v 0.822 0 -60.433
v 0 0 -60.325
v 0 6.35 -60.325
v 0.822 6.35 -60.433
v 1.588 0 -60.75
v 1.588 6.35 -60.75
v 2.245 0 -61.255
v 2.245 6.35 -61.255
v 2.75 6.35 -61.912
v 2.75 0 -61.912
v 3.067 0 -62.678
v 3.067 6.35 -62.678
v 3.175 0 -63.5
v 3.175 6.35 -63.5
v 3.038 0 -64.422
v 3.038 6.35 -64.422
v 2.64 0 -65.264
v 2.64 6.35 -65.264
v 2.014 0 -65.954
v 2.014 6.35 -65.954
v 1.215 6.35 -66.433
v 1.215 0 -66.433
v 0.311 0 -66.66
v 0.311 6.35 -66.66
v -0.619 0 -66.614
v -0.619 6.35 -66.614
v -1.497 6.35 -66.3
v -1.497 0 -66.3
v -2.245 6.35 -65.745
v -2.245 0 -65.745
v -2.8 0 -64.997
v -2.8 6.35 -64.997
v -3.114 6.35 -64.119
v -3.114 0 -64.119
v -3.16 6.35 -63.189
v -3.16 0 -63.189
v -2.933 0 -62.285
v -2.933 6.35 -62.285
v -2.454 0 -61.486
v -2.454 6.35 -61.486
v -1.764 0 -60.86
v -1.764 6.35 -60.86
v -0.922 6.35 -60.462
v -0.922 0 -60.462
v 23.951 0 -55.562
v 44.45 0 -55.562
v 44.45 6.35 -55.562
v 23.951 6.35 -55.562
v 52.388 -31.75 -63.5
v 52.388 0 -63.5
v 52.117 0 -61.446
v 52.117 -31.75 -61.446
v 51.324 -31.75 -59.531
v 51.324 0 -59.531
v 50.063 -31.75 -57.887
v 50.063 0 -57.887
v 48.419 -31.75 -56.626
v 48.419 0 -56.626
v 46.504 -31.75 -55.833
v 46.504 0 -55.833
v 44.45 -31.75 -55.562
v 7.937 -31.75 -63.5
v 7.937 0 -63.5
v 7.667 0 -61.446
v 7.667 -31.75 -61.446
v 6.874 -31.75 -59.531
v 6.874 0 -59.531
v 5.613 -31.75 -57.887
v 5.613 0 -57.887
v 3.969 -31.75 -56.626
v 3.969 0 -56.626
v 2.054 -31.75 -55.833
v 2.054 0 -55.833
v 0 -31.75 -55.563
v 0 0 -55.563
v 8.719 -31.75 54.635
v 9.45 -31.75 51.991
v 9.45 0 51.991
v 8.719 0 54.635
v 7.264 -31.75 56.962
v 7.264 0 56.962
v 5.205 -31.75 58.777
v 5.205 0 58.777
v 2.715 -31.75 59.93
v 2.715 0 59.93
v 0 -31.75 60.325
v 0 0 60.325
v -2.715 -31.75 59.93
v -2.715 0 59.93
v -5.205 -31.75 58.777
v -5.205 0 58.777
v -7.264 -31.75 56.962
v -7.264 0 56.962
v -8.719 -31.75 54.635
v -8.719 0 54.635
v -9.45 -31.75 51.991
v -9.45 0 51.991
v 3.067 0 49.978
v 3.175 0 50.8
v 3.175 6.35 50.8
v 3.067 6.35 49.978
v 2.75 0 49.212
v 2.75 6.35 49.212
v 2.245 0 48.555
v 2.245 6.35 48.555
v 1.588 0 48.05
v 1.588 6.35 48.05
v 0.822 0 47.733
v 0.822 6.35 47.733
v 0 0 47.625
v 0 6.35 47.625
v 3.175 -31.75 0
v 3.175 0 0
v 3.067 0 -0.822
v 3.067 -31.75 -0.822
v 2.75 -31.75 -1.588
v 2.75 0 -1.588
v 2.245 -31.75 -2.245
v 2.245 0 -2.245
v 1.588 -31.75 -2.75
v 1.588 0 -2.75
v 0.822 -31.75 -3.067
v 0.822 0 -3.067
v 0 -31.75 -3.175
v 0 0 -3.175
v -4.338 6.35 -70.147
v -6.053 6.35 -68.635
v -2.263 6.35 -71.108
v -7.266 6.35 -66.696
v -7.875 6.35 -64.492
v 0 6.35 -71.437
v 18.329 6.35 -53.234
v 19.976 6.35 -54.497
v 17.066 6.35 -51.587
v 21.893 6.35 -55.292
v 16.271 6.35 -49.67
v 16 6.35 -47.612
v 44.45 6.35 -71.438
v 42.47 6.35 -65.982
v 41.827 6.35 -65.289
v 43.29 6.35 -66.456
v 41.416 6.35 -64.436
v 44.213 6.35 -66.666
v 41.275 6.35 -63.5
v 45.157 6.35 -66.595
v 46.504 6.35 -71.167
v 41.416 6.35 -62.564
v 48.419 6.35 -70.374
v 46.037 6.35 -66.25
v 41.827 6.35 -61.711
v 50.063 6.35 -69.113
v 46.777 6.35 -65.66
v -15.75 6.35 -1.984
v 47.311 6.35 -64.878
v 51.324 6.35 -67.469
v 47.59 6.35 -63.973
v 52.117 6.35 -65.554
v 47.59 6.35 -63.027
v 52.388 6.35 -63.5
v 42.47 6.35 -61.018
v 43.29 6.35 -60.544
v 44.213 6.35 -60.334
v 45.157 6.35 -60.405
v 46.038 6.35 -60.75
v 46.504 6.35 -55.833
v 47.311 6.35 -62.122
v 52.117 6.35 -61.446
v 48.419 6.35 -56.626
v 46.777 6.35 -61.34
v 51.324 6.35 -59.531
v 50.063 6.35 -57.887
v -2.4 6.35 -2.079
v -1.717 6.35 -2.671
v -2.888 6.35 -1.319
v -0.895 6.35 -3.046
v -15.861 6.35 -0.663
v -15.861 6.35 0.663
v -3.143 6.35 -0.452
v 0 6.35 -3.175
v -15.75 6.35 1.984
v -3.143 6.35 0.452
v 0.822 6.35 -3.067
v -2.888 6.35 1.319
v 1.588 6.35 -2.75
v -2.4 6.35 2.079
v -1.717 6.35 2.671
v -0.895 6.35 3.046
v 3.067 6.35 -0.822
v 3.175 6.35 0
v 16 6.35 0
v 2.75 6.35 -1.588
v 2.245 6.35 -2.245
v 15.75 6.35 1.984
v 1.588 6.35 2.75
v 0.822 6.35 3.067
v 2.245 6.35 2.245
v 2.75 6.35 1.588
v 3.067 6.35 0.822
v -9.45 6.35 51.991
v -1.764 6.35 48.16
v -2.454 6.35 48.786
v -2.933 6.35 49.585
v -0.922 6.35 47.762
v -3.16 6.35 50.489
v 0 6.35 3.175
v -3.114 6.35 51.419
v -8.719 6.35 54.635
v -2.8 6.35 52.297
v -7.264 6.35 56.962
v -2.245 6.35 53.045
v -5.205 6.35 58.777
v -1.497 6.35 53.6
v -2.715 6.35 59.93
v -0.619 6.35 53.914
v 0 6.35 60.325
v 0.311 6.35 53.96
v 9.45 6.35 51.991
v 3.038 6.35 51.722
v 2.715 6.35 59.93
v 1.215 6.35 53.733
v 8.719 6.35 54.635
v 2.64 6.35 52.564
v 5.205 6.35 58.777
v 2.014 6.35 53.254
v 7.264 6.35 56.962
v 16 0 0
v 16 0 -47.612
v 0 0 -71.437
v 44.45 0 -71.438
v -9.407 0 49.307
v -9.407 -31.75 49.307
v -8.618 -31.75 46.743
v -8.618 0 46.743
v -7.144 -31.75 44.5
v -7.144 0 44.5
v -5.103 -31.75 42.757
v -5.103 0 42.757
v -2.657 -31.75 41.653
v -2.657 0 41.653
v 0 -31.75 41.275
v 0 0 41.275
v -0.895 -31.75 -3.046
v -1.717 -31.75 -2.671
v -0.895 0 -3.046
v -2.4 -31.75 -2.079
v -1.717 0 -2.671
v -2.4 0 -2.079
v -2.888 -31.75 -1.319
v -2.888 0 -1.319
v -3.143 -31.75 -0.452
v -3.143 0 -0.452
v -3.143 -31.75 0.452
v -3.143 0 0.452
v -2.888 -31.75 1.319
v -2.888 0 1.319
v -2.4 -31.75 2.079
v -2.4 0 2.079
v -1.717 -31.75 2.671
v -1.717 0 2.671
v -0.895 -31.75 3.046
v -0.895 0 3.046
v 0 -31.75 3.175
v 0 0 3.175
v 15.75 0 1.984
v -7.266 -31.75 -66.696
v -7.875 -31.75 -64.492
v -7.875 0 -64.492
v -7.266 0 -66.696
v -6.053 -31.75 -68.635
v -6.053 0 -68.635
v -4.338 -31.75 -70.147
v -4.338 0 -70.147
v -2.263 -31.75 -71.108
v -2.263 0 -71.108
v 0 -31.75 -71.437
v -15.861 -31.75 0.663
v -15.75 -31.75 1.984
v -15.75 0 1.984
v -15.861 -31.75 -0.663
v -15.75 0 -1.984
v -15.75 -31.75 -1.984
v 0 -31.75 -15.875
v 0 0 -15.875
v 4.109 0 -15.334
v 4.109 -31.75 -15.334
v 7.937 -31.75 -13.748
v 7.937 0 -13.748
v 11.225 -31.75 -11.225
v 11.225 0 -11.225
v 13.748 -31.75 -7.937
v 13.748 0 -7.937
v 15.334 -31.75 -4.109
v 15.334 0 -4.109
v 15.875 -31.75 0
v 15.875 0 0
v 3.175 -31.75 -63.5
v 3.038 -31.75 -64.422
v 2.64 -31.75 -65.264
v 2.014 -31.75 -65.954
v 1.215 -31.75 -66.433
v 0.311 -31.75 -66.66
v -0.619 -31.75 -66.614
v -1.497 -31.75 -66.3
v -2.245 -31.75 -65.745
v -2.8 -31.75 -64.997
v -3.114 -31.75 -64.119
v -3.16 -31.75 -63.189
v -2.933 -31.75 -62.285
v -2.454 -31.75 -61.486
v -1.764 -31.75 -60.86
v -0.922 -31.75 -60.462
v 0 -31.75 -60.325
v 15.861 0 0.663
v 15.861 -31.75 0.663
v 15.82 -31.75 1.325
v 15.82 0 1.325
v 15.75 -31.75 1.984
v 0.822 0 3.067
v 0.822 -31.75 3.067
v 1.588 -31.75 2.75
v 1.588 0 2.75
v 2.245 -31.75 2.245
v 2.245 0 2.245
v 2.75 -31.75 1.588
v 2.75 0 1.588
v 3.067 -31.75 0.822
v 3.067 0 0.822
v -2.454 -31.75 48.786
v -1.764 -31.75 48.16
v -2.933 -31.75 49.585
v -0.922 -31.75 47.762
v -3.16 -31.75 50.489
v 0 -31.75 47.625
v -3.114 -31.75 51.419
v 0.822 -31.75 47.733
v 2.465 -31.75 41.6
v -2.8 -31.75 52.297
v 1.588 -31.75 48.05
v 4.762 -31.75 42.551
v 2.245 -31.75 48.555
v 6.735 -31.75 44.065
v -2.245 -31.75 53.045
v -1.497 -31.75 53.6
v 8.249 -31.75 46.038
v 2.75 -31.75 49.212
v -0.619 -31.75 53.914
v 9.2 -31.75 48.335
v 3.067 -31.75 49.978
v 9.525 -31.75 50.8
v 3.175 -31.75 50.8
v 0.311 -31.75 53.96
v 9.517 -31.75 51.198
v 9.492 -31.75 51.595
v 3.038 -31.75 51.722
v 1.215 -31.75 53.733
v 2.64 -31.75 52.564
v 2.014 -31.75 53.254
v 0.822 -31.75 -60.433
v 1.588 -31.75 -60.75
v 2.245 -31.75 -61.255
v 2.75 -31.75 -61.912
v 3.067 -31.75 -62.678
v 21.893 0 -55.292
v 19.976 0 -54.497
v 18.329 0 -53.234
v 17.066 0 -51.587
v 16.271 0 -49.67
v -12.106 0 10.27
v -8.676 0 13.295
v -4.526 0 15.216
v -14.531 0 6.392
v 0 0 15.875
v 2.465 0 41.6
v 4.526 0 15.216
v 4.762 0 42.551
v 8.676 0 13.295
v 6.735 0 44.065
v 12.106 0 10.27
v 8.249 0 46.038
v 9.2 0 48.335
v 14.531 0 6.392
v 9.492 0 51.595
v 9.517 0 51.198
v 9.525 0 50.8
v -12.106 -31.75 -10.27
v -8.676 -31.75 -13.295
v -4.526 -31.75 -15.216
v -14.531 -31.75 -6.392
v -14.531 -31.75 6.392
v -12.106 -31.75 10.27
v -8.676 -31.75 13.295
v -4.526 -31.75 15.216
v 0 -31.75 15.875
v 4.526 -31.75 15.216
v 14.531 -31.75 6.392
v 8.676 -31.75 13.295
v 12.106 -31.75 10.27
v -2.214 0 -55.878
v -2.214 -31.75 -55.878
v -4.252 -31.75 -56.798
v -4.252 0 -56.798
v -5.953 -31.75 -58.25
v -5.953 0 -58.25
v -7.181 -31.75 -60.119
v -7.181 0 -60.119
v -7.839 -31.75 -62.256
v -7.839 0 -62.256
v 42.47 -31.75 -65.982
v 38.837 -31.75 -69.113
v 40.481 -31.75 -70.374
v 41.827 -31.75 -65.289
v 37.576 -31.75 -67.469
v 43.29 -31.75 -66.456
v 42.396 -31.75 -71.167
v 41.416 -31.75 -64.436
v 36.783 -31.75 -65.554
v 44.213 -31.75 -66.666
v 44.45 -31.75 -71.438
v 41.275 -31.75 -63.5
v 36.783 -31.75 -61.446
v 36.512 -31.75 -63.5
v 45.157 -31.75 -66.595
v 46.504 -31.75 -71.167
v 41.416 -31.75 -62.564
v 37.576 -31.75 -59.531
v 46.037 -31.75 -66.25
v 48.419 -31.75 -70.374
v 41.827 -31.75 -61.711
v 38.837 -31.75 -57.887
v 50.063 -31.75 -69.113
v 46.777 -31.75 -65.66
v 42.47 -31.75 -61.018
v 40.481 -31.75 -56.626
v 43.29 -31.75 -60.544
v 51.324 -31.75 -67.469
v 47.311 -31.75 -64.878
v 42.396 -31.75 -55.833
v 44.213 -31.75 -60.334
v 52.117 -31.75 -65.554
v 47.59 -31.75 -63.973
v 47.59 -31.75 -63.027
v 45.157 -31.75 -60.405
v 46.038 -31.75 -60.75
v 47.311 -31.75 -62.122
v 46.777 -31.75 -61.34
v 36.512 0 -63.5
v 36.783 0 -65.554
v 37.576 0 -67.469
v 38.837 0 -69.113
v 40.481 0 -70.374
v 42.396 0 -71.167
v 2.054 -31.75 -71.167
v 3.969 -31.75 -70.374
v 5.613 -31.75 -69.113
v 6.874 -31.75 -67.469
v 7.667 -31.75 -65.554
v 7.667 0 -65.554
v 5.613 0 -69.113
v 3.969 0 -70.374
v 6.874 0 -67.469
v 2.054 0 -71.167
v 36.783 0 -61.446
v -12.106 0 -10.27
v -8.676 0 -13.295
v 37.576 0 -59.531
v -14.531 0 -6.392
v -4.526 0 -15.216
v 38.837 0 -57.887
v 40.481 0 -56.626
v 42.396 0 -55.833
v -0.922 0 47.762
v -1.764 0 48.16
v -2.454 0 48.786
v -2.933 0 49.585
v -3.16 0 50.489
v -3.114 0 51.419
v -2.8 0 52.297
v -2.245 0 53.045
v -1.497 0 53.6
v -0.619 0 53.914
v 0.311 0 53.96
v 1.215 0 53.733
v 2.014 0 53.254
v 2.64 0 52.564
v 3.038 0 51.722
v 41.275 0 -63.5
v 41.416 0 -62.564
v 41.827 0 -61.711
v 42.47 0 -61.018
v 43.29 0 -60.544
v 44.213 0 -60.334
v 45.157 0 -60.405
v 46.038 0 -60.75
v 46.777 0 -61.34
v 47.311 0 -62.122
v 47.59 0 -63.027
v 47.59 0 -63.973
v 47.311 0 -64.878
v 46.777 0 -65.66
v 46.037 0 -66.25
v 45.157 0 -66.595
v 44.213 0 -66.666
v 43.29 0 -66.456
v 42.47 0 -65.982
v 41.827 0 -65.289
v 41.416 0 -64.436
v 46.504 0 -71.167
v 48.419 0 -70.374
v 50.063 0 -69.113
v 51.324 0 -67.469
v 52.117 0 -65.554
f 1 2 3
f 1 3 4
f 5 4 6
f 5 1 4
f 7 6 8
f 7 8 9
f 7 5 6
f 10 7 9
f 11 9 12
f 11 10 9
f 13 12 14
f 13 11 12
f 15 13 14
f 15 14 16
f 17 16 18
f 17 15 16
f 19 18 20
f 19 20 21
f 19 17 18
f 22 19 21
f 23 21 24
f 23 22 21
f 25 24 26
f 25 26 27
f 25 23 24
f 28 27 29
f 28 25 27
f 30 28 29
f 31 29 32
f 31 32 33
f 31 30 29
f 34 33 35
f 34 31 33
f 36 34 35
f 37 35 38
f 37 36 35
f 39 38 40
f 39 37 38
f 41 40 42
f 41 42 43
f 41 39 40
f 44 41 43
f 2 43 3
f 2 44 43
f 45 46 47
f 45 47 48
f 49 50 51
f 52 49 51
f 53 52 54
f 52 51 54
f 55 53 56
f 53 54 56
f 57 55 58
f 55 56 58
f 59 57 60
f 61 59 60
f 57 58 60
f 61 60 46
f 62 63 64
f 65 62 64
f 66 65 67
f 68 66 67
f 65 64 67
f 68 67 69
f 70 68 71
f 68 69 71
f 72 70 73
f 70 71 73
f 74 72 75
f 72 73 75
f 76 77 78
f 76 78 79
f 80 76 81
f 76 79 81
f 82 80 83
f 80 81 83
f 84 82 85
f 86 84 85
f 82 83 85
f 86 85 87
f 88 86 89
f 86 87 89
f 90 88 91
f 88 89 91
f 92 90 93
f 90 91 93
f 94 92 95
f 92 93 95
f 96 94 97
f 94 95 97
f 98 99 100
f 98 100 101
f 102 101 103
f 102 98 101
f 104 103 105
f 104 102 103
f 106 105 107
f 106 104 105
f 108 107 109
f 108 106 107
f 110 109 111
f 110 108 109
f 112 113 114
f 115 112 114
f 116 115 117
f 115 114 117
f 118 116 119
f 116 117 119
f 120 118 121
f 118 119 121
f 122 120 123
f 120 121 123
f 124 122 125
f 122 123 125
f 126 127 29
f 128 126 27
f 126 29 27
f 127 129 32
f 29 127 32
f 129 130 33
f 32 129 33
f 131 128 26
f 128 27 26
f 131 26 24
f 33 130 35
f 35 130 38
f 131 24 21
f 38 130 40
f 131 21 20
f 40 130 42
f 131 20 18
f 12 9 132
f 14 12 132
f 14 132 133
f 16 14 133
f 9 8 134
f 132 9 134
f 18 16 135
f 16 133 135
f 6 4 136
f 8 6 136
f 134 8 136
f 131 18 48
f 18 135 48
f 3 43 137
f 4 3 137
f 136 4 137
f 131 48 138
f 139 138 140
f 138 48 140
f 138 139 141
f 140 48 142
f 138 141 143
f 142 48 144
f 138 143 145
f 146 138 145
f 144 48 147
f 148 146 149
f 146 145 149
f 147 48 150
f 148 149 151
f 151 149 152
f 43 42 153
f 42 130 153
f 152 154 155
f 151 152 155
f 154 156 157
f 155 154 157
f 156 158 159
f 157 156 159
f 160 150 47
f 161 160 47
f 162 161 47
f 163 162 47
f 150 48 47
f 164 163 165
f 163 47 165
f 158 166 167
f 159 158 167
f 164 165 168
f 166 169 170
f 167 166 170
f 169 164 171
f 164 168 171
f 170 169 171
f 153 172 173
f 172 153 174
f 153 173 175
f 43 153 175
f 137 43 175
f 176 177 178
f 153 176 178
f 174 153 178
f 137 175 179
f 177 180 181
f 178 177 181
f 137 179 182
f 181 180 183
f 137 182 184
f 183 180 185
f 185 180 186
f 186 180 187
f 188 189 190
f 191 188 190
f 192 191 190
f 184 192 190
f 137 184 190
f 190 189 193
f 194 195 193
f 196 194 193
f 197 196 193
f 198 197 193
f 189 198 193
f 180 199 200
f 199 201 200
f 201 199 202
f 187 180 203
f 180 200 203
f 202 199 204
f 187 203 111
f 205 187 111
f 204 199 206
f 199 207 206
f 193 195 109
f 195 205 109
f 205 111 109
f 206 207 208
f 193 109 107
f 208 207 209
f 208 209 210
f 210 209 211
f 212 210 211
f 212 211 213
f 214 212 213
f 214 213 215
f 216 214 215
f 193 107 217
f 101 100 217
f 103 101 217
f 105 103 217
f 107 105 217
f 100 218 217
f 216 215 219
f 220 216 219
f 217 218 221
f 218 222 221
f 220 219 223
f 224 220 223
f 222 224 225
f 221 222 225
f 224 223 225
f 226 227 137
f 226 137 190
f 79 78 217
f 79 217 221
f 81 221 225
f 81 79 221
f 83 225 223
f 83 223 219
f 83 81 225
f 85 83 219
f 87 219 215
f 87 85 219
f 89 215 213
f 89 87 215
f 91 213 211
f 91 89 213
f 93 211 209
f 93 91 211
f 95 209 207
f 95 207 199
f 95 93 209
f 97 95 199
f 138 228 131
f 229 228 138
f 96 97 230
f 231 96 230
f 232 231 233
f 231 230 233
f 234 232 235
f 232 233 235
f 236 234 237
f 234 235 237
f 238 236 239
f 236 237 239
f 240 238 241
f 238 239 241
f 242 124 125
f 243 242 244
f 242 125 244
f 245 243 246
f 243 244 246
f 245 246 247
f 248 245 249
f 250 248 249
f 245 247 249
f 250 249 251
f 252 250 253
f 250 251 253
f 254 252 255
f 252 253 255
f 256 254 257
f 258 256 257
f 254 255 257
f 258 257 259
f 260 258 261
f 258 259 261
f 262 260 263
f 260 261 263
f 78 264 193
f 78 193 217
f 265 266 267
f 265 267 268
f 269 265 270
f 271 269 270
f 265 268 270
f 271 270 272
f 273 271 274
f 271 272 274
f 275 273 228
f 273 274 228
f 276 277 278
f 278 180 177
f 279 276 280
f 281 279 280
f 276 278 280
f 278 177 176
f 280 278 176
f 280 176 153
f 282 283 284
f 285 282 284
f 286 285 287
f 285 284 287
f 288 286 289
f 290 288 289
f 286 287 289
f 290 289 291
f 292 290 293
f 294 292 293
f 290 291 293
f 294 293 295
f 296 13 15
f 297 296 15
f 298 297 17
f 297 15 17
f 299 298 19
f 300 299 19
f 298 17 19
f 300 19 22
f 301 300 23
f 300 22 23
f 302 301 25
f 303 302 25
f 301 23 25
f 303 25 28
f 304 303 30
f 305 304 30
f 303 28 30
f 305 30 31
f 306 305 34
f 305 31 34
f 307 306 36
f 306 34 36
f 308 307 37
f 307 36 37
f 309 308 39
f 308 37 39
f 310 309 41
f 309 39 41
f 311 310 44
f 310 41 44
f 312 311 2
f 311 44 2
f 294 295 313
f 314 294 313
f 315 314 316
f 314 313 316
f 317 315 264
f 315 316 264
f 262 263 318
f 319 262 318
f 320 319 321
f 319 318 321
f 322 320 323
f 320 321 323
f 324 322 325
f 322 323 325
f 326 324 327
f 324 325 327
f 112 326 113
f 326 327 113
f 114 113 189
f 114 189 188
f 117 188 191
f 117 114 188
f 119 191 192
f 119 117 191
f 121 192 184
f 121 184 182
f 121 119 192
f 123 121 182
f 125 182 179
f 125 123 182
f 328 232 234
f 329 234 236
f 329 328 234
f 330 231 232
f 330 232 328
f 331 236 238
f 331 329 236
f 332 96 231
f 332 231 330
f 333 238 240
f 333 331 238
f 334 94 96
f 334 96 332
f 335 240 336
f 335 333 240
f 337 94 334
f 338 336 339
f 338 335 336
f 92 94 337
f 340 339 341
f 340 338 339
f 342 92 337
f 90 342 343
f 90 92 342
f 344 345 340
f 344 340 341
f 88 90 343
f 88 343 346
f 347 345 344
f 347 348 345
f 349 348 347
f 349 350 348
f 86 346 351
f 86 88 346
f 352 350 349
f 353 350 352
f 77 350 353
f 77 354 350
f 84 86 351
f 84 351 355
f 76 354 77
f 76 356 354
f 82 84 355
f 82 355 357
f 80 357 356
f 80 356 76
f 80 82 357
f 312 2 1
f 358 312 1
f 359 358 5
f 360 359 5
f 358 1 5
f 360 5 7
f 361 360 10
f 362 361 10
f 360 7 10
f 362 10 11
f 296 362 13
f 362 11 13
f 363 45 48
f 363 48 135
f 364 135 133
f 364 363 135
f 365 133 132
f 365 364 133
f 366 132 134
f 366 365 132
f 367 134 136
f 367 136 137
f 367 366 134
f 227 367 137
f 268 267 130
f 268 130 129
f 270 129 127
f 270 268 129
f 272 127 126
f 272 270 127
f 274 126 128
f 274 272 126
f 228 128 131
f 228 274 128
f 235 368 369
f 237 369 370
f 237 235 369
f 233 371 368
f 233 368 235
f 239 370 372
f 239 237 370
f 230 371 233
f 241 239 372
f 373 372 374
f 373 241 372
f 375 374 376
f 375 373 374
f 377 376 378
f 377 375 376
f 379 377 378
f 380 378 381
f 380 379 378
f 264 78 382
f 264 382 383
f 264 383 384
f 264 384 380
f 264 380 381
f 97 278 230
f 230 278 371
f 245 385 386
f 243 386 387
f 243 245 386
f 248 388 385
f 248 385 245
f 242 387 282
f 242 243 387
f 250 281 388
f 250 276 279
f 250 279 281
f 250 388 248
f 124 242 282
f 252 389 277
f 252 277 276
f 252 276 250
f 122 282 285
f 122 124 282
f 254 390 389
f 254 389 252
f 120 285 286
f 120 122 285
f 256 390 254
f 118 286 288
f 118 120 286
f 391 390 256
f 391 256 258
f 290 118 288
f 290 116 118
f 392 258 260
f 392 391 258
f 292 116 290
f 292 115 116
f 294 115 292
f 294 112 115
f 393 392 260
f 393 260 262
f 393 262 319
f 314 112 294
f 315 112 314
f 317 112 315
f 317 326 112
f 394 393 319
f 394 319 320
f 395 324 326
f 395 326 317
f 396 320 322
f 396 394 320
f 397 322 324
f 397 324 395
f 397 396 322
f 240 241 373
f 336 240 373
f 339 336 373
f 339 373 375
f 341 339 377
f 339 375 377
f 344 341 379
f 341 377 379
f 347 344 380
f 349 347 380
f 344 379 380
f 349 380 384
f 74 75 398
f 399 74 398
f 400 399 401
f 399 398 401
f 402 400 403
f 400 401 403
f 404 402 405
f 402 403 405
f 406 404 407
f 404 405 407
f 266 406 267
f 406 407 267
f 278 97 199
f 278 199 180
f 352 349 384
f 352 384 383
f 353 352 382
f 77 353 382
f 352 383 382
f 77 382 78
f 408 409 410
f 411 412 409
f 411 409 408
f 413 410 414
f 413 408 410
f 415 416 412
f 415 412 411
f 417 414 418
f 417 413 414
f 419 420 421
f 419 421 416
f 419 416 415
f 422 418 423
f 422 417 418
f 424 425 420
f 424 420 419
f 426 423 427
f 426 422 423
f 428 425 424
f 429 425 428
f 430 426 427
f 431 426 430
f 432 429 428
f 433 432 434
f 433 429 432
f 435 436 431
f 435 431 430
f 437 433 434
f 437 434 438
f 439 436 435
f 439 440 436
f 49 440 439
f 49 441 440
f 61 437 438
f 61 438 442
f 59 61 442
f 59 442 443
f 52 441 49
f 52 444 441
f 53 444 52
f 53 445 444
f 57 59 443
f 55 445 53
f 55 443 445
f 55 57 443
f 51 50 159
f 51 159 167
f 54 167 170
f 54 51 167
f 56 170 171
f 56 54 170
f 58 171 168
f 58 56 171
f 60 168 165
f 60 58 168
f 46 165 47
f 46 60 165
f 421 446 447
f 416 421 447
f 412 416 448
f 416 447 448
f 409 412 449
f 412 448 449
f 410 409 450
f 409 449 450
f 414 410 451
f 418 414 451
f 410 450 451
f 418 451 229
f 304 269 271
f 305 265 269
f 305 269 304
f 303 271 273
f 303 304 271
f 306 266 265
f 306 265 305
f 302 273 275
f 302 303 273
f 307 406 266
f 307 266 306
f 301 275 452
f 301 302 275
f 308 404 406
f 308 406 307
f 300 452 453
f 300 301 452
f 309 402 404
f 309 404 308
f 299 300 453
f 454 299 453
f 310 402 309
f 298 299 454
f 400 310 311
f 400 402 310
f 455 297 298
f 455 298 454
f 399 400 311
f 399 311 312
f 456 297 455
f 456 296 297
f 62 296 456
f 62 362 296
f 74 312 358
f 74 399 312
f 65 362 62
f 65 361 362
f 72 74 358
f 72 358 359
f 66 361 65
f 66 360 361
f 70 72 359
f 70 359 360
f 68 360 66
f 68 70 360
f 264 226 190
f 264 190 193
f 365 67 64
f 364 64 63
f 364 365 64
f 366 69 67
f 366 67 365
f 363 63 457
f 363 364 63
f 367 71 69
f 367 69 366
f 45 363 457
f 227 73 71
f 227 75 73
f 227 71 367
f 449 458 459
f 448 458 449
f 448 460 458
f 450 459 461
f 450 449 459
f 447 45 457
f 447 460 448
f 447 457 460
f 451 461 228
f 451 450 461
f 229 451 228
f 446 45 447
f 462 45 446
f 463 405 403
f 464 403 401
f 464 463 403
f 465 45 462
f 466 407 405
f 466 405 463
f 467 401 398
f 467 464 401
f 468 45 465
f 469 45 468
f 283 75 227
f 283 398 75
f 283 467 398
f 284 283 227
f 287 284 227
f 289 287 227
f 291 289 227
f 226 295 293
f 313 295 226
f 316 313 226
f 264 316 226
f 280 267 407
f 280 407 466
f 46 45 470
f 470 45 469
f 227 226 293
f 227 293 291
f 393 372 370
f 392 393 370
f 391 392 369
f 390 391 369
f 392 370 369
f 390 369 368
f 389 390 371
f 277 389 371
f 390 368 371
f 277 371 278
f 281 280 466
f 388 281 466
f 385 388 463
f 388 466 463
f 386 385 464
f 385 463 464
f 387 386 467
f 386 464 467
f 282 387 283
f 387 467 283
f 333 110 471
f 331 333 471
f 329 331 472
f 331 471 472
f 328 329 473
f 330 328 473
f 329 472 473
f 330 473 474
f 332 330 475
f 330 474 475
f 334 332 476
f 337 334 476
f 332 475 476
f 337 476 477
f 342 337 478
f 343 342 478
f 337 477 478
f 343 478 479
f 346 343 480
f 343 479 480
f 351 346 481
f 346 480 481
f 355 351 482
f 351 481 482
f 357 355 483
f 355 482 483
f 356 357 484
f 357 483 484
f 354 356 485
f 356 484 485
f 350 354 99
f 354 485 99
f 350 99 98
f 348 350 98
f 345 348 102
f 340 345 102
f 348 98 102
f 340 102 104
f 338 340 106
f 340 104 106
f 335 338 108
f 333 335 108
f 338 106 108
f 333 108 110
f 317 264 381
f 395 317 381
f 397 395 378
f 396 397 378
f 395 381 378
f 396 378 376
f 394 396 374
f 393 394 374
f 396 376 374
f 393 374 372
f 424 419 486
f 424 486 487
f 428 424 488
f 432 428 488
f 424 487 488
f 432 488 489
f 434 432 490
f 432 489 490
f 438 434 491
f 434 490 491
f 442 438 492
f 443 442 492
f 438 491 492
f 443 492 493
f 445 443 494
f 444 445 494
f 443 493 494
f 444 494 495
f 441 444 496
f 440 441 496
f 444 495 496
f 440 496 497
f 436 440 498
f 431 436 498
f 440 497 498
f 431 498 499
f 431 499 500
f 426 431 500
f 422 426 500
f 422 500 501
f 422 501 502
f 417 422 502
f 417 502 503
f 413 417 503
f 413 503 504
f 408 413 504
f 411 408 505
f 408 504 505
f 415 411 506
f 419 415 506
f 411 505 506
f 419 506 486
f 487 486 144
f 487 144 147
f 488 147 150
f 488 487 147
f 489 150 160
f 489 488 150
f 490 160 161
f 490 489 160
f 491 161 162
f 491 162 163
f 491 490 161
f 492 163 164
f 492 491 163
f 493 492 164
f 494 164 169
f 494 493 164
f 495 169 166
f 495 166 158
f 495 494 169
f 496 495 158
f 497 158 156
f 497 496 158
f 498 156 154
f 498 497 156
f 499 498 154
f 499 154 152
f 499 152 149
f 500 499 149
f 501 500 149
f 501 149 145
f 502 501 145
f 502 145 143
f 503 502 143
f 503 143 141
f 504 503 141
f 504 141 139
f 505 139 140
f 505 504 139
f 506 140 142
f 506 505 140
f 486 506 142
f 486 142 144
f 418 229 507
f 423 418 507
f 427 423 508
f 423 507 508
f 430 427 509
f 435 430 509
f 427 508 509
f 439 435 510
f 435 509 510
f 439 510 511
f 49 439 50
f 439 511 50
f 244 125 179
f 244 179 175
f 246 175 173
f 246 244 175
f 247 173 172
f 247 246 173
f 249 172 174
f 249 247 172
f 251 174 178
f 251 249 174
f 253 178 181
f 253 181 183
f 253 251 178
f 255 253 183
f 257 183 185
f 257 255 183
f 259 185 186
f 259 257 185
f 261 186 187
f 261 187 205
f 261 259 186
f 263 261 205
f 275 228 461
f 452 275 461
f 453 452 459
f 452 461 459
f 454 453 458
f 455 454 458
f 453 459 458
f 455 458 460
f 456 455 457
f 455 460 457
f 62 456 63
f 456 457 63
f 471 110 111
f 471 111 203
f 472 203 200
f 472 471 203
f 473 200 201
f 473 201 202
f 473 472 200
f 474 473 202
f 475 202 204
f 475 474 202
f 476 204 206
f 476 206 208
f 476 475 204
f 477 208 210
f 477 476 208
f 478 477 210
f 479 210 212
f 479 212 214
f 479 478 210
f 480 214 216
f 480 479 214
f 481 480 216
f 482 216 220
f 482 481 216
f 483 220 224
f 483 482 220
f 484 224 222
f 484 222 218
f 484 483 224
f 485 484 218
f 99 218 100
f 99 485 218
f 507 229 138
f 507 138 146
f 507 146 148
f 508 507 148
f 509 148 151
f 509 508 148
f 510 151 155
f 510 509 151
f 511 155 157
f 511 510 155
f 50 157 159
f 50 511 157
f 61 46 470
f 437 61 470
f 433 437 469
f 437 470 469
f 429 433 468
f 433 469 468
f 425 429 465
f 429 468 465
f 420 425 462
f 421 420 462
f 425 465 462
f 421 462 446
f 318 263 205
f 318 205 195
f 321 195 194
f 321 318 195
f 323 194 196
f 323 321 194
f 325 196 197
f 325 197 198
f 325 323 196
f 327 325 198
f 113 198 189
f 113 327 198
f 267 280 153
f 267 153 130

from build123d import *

# Parameters (mm, degrees)
F1_DEPTH = 6.35
F2_DEPTH = 31.75


with BuildPart() as f1:
    # F0 (on Front) → F1 (new body)
    with BuildSketch(Plane.XZ):
        with BuildLine():
            ThreePointArc((0, -15.875), (11.2253201513, -11.2253201513), (15.875, 0))
            ThreePointArc((15.875, 0), (15.8438414983, 0.9941386111), (15.7504883051, 1.9843747505))
            ThreePointArc((15.7504883051, 1.9843747505), (10.5003256101, 11.9062499168), (0, 15.875))
            Line((0, 15.875), (0, 3.175))
            ThreePointArc((0, 3.175), (2.2450640303, 2.2450640303), (3.175, 0))
            ThreePointArc((3.175, 0), (2.2450640303, -2.2450640303), (0, -3.175))
            Line((0, -3.175), (0, -15.875))
        make_face()
        with BuildLine():
            ThreePointArc((-15.7504893995, -1.9843660644), (-10.5003288931, -11.9062470215), (0, -15.875))
            Line((0, -15.875), (0, -3.175))
            ThreePointArc((0, -3.175), (-3.175, 0), (0, 3.175))
            Line((0, 3.175), (0, 15.875))
            ThreePointArc((0, 15.875), (-10.5003288957, 11.9062470192), (-15.7504894003, 1.9843660577))
            ThreePointArc((-15.7504894003, 1.9843660577), (-15.875, -3.4e-09), (-15.7504893995, -1.9843660644))
        make_face()
        with BuildLine():
            ThreePointArc((9.525, 50.8), (9.5063048942, 51.396483242), (9.4502929642, 51.990625))
            ThreePointArc((9.4502929642, 51.990625), (0, 60.325), (-9.4502929642, 51.990625))
            ThreePointArc((-9.4502929642, 51.990625), (-7.14375, 44.4998046905), (0, 41.275))
            ThreePointArc((0, 41.275), (6.7351920908, 44.0648079092), (9.525, 50.8))
        make_face()
        with BuildLine():
            ThreePointArc((3.175, 50.8), (2.2450640303, 48.5549359697), (0, 47.625))
            ThreePointArc((0, 47.625), (-2.2450640303, 53.0450640303), (3.175, 50.8))
        make_face(mode=Mode.SUBTRACT)
        with BuildLine():
            ThreePointArc((7.937499997, -63.5), (5.6126600736, -57.8873399264), (0, -55.562500003))
            Line((0, -55.562500003), (0, -60.325))
            ThreePointArc((0, -60.325), (2.2450640303, -61.2549359697), (3.175, -63.5))
            Line((3.175, -63.5), (7.937499997, -63.5))
        make_face()
        with BuildLine():
            Line((0, -60.325), (0, -55.562500003))
            ThreePointArc((0, -55.562500003), (-5.9531249979, -58.2498372442), (-7.8752441339, -64.4921875))
            ThreePointArc((-7.8752441339, -64.4921875), (-5.2501627558, -69.4531249979), (0, -71.437499997))
            ThreePointArc((0, -71.437499997), (5.6126600736, -69.1126600736), (7.937499997, -63.5))
            Line((7.937499997, -63.5), (3.175, -63.5))
            ThreePointArc((3.175, -63.5), (-2.2450640303, -65.7450640303), (0, -60.325))
        make_face()
        with BuildLine():
            ThreePointArc((44.45, -55.562499997), (38.8373399222, -57.8873399222), (36.512499997, -63.5))
            ThreePointArc((36.512499997, -63.5), (38.8373399222, -69.1126600778), (44.45, -71.437500003))
            ThreePointArc((44.45, -71.437500003), (50.0626600778, -69.1126600778), (52.387500003, -63.5))
            ThreePointArc((52.387500003, -63.5), (50.0626600778, -57.8873399222), (44.45, -55.562499997))
        make_face()
        with BuildLine():
            ThreePointArc((47.625, -63.5), (44.45, -66.675), (41.275, -63.5))
            ThreePointArc((41.275, -63.5), (44.45, -60.325), (47.625, -63.5))
        make_face(mode=Mode.SUBTRACT)
        with BuildLine():
            ThreePointArc((-15.7504894003, 1.9843660577), (-10.5003288957, 11.9062470192), (0, 15.875))
            Line((0, 15.875), (0, 41.275))
            ThreePointArc((0, 41.275), (-7.14375, 44.4998046905), (-9.4502929642, 51.990625))
            Line((-9.4502929642, 51.990625), (-15.7504894003, 1.9843660577))
        make_face()
        with BuildLine():
            ThreePointArc((15.7504883051, 1.9843747505), (15.8438414983, 0.9941386111), (15.875, 0))
            ThreePointArc((15.875, 0), (11.2253201513, -11.2253201513), (0, -15.875))
            Line((0, -15.875), (0, -55.562500003))
            ThreePointArc((0, -55.562500003), (5.6126600736, -57.8873399264), (7.937499997, -63.5))
            Line((7.937499997, -63.5), (36.512499997, -63.5))
            ThreePointArc((36.512499997, -63.5), (38.8373399222, -57.8873399222), (44.45, -55.562499997))
            Line((44.45, -55.5624999909), (23.9506960241, -55.5624999909))
            ThreePointArc((23.9506960241, -55.5624999909), (18.3290556923, -53.2339403227), (16.0004960241, -47.6122999909))
            Line((16.0004960241, -47.6122999909), (16.0004960241, 0))
            Line((16.0004960241, 0), (15.7504883051, 1.9843747505))
        make_face()
        with BuildLine():
            Line((0, -55.562500003), (0, -15.875))
            ThreePointArc((0, -15.875), (-10.5003288931, -11.9062470215), (-15.7504893995, -1.9843660644))
            Line((-15.7504893995, -1.9843660644), (-7.8752441339, -64.4921875))
            ThreePointArc((-7.8752441339, -64.4921875), (-5.9531249979, -58.2498372442), (0, -55.562500003))
        make_face()
        with BuildLine():
            ThreePointArc((0, 15.875), (10.5003256101, 11.9062499168), (15.7504883051, 1.9843747505))
            Line((15.7504883051, 1.9843747505), (9.4502929642, 51.990625))
            ThreePointArc((9.4502929642, 51.990625), (9.5063048942, 51.396483242), (9.525, 50.8))
            ThreePointArc((9.525, 50.8), (6.7351920908, 44.0648079092), (0, 41.275))
            Line((0, 41.275), (0, 15.875))
        make_face()
        with BuildLine():
            Line((36.512499997, -63.5), (7.937499997, -63.5))
            ThreePointArc((7.937499997, -63.5), (5.6126600736, -69.1126600736), (0, -71.437499997))
            Line((0, -71.4374999998), (44.45, -71.4374999998))
            ThreePointArc((44.45, -71.437500003), (38.8373399222, -69.1126600778), (36.512499997, -63.5))
        make_face()
    extrude(amount=-F1_DEPTH)

    # F0 (on Front) → F2 (join)
    with BuildSketch(Plane.XZ):
        with BuildLine():
            ThreePointArc((-15.7504893995, -1.9843660644), (-10.5003288931, -11.9062470215), (0, -15.875))
            Line((0, -15.875), (0, -3.175))
            ThreePointArc((0, -3.175), (-3.175, 0), (0, 3.175))
            Line((0, 3.175), (0, 15.875))
            ThreePointArc((0, 15.875), (-10.5003288957, 11.9062470192), (-15.7504894003, 1.9843660577))
            ThreePointArc((-15.7504894003, 1.9843660577), (-15.875, -3.4e-09), (-15.7504893995, -1.9843660644))
        make_face()
        with BuildLine():
            ThreePointArc((0, -15.875), (11.2253201513, -11.2253201513), (15.875, 0))
            ThreePointArc((15.875, 0), (15.8438414983, 0.9941386111), (15.7504883051, 1.9843747505))
            ThreePointArc((15.7504883051, 1.9843747505), (10.5003256101, 11.9062499168), (0, 15.875))
            Line((0, 15.875), (0, 3.175))
            ThreePointArc((0, 3.175), (2.2450640303, 2.2450640303), (3.175, 0))
            ThreePointArc((3.175, 0), (2.2450640303, -2.2450640303), (0, -3.175))
            Line((0, -3.175), (0, -15.875))
        make_face()
        with BuildLine():
            Line((0, -60.325), (0, -55.562500003))
            ThreePointArc((0, -55.562500003), (-5.9531249979, -58.2498372442), (-7.8752441339, -64.4921875))
            ThreePointArc((-7.8752441339, -64.4921875), (-5.2501627558, -69.4531249979), (0, -71.437499997))
            ThreePointArc((0, -71.437499997), (5.6126600736, -69.1126600736), (7.937499997, -63.5))
            Line((7.937499997, -63.5), (3.175, -63.5))
            ThreePointArc((3.175, -63.5), (-2.2450640303, -65.7450640303), (0, -60.325))
        make_face()
        with BuildLine():
            ThreePointArc((7.937499997, -63.5), (5.6126600736, -57.8873399264), (0, -55.562500003))
            Line((0, -55.562500003), (0, -60.325))
            ThreePointArc((0, -60.325), (2.2450640303, -61.2549359697), (3.175, -63.5))
            Line((3.175, -63.5), (7.937499997, -63.5))
        make_face()
        with BuildLine():
            ThreePointArc((44.45, -55.562499997), (38.8373399222, -57.8873399222), (36.512499997, -63.5))
            ThreePointArc((36.512499997, -63.5), (38.8373399222, -69.1126600778), (44.45, -71.437500003))
            ThreePointArc((44.45, -71.437500003), (50.0626600778, -69.1126600778), (52.387500003, -63.5))
            ThreePointArc((52.387500003, -63.5), (50.0626600778, -57.8873399222), (44.45, -55.562499997))
        make_face()
        with BuildLine():
            ThreePointArc((47.625, -63.5), (44.45, -66.675), (41.275, -63.5))
            ThreePointArc((41.275, -63.5), (44.45, -60.325), (47.625, -63.5))
        make_face(mode=Mode.SUBTRACT)
        with BuildLine():
            ThreePointArc((9.525, 50.8), (9.5063048942, 51.396483242), (9.4502929642, 51.990625))
            ThreePointArc((9.4502929642, 51.990625), (0, 60.325), (-9.4502929642, 51.990625))
            ThreePointArc((-9.4502929642, 51.990625), (-7.14375, 44.4998046905), (0, 41.275))
            ThreePointArc((0, 41.275), (6.7351920908, 44.0648079092), (9.525, 50.8))
        make_face()
        with BuildLine():
            ThreePointArc((3.175, 50.8), (2.2450640303, 48.5549359697), (0, 47.625))
            ThreePointArc((0, 47.625), (-2.2450640303, 53.0450640303), (3.175, 50.8))
        make_face(mode=Mode.SUBTRACT)
    extrude(amount=F2_DEPTH)


solid = f1.part
